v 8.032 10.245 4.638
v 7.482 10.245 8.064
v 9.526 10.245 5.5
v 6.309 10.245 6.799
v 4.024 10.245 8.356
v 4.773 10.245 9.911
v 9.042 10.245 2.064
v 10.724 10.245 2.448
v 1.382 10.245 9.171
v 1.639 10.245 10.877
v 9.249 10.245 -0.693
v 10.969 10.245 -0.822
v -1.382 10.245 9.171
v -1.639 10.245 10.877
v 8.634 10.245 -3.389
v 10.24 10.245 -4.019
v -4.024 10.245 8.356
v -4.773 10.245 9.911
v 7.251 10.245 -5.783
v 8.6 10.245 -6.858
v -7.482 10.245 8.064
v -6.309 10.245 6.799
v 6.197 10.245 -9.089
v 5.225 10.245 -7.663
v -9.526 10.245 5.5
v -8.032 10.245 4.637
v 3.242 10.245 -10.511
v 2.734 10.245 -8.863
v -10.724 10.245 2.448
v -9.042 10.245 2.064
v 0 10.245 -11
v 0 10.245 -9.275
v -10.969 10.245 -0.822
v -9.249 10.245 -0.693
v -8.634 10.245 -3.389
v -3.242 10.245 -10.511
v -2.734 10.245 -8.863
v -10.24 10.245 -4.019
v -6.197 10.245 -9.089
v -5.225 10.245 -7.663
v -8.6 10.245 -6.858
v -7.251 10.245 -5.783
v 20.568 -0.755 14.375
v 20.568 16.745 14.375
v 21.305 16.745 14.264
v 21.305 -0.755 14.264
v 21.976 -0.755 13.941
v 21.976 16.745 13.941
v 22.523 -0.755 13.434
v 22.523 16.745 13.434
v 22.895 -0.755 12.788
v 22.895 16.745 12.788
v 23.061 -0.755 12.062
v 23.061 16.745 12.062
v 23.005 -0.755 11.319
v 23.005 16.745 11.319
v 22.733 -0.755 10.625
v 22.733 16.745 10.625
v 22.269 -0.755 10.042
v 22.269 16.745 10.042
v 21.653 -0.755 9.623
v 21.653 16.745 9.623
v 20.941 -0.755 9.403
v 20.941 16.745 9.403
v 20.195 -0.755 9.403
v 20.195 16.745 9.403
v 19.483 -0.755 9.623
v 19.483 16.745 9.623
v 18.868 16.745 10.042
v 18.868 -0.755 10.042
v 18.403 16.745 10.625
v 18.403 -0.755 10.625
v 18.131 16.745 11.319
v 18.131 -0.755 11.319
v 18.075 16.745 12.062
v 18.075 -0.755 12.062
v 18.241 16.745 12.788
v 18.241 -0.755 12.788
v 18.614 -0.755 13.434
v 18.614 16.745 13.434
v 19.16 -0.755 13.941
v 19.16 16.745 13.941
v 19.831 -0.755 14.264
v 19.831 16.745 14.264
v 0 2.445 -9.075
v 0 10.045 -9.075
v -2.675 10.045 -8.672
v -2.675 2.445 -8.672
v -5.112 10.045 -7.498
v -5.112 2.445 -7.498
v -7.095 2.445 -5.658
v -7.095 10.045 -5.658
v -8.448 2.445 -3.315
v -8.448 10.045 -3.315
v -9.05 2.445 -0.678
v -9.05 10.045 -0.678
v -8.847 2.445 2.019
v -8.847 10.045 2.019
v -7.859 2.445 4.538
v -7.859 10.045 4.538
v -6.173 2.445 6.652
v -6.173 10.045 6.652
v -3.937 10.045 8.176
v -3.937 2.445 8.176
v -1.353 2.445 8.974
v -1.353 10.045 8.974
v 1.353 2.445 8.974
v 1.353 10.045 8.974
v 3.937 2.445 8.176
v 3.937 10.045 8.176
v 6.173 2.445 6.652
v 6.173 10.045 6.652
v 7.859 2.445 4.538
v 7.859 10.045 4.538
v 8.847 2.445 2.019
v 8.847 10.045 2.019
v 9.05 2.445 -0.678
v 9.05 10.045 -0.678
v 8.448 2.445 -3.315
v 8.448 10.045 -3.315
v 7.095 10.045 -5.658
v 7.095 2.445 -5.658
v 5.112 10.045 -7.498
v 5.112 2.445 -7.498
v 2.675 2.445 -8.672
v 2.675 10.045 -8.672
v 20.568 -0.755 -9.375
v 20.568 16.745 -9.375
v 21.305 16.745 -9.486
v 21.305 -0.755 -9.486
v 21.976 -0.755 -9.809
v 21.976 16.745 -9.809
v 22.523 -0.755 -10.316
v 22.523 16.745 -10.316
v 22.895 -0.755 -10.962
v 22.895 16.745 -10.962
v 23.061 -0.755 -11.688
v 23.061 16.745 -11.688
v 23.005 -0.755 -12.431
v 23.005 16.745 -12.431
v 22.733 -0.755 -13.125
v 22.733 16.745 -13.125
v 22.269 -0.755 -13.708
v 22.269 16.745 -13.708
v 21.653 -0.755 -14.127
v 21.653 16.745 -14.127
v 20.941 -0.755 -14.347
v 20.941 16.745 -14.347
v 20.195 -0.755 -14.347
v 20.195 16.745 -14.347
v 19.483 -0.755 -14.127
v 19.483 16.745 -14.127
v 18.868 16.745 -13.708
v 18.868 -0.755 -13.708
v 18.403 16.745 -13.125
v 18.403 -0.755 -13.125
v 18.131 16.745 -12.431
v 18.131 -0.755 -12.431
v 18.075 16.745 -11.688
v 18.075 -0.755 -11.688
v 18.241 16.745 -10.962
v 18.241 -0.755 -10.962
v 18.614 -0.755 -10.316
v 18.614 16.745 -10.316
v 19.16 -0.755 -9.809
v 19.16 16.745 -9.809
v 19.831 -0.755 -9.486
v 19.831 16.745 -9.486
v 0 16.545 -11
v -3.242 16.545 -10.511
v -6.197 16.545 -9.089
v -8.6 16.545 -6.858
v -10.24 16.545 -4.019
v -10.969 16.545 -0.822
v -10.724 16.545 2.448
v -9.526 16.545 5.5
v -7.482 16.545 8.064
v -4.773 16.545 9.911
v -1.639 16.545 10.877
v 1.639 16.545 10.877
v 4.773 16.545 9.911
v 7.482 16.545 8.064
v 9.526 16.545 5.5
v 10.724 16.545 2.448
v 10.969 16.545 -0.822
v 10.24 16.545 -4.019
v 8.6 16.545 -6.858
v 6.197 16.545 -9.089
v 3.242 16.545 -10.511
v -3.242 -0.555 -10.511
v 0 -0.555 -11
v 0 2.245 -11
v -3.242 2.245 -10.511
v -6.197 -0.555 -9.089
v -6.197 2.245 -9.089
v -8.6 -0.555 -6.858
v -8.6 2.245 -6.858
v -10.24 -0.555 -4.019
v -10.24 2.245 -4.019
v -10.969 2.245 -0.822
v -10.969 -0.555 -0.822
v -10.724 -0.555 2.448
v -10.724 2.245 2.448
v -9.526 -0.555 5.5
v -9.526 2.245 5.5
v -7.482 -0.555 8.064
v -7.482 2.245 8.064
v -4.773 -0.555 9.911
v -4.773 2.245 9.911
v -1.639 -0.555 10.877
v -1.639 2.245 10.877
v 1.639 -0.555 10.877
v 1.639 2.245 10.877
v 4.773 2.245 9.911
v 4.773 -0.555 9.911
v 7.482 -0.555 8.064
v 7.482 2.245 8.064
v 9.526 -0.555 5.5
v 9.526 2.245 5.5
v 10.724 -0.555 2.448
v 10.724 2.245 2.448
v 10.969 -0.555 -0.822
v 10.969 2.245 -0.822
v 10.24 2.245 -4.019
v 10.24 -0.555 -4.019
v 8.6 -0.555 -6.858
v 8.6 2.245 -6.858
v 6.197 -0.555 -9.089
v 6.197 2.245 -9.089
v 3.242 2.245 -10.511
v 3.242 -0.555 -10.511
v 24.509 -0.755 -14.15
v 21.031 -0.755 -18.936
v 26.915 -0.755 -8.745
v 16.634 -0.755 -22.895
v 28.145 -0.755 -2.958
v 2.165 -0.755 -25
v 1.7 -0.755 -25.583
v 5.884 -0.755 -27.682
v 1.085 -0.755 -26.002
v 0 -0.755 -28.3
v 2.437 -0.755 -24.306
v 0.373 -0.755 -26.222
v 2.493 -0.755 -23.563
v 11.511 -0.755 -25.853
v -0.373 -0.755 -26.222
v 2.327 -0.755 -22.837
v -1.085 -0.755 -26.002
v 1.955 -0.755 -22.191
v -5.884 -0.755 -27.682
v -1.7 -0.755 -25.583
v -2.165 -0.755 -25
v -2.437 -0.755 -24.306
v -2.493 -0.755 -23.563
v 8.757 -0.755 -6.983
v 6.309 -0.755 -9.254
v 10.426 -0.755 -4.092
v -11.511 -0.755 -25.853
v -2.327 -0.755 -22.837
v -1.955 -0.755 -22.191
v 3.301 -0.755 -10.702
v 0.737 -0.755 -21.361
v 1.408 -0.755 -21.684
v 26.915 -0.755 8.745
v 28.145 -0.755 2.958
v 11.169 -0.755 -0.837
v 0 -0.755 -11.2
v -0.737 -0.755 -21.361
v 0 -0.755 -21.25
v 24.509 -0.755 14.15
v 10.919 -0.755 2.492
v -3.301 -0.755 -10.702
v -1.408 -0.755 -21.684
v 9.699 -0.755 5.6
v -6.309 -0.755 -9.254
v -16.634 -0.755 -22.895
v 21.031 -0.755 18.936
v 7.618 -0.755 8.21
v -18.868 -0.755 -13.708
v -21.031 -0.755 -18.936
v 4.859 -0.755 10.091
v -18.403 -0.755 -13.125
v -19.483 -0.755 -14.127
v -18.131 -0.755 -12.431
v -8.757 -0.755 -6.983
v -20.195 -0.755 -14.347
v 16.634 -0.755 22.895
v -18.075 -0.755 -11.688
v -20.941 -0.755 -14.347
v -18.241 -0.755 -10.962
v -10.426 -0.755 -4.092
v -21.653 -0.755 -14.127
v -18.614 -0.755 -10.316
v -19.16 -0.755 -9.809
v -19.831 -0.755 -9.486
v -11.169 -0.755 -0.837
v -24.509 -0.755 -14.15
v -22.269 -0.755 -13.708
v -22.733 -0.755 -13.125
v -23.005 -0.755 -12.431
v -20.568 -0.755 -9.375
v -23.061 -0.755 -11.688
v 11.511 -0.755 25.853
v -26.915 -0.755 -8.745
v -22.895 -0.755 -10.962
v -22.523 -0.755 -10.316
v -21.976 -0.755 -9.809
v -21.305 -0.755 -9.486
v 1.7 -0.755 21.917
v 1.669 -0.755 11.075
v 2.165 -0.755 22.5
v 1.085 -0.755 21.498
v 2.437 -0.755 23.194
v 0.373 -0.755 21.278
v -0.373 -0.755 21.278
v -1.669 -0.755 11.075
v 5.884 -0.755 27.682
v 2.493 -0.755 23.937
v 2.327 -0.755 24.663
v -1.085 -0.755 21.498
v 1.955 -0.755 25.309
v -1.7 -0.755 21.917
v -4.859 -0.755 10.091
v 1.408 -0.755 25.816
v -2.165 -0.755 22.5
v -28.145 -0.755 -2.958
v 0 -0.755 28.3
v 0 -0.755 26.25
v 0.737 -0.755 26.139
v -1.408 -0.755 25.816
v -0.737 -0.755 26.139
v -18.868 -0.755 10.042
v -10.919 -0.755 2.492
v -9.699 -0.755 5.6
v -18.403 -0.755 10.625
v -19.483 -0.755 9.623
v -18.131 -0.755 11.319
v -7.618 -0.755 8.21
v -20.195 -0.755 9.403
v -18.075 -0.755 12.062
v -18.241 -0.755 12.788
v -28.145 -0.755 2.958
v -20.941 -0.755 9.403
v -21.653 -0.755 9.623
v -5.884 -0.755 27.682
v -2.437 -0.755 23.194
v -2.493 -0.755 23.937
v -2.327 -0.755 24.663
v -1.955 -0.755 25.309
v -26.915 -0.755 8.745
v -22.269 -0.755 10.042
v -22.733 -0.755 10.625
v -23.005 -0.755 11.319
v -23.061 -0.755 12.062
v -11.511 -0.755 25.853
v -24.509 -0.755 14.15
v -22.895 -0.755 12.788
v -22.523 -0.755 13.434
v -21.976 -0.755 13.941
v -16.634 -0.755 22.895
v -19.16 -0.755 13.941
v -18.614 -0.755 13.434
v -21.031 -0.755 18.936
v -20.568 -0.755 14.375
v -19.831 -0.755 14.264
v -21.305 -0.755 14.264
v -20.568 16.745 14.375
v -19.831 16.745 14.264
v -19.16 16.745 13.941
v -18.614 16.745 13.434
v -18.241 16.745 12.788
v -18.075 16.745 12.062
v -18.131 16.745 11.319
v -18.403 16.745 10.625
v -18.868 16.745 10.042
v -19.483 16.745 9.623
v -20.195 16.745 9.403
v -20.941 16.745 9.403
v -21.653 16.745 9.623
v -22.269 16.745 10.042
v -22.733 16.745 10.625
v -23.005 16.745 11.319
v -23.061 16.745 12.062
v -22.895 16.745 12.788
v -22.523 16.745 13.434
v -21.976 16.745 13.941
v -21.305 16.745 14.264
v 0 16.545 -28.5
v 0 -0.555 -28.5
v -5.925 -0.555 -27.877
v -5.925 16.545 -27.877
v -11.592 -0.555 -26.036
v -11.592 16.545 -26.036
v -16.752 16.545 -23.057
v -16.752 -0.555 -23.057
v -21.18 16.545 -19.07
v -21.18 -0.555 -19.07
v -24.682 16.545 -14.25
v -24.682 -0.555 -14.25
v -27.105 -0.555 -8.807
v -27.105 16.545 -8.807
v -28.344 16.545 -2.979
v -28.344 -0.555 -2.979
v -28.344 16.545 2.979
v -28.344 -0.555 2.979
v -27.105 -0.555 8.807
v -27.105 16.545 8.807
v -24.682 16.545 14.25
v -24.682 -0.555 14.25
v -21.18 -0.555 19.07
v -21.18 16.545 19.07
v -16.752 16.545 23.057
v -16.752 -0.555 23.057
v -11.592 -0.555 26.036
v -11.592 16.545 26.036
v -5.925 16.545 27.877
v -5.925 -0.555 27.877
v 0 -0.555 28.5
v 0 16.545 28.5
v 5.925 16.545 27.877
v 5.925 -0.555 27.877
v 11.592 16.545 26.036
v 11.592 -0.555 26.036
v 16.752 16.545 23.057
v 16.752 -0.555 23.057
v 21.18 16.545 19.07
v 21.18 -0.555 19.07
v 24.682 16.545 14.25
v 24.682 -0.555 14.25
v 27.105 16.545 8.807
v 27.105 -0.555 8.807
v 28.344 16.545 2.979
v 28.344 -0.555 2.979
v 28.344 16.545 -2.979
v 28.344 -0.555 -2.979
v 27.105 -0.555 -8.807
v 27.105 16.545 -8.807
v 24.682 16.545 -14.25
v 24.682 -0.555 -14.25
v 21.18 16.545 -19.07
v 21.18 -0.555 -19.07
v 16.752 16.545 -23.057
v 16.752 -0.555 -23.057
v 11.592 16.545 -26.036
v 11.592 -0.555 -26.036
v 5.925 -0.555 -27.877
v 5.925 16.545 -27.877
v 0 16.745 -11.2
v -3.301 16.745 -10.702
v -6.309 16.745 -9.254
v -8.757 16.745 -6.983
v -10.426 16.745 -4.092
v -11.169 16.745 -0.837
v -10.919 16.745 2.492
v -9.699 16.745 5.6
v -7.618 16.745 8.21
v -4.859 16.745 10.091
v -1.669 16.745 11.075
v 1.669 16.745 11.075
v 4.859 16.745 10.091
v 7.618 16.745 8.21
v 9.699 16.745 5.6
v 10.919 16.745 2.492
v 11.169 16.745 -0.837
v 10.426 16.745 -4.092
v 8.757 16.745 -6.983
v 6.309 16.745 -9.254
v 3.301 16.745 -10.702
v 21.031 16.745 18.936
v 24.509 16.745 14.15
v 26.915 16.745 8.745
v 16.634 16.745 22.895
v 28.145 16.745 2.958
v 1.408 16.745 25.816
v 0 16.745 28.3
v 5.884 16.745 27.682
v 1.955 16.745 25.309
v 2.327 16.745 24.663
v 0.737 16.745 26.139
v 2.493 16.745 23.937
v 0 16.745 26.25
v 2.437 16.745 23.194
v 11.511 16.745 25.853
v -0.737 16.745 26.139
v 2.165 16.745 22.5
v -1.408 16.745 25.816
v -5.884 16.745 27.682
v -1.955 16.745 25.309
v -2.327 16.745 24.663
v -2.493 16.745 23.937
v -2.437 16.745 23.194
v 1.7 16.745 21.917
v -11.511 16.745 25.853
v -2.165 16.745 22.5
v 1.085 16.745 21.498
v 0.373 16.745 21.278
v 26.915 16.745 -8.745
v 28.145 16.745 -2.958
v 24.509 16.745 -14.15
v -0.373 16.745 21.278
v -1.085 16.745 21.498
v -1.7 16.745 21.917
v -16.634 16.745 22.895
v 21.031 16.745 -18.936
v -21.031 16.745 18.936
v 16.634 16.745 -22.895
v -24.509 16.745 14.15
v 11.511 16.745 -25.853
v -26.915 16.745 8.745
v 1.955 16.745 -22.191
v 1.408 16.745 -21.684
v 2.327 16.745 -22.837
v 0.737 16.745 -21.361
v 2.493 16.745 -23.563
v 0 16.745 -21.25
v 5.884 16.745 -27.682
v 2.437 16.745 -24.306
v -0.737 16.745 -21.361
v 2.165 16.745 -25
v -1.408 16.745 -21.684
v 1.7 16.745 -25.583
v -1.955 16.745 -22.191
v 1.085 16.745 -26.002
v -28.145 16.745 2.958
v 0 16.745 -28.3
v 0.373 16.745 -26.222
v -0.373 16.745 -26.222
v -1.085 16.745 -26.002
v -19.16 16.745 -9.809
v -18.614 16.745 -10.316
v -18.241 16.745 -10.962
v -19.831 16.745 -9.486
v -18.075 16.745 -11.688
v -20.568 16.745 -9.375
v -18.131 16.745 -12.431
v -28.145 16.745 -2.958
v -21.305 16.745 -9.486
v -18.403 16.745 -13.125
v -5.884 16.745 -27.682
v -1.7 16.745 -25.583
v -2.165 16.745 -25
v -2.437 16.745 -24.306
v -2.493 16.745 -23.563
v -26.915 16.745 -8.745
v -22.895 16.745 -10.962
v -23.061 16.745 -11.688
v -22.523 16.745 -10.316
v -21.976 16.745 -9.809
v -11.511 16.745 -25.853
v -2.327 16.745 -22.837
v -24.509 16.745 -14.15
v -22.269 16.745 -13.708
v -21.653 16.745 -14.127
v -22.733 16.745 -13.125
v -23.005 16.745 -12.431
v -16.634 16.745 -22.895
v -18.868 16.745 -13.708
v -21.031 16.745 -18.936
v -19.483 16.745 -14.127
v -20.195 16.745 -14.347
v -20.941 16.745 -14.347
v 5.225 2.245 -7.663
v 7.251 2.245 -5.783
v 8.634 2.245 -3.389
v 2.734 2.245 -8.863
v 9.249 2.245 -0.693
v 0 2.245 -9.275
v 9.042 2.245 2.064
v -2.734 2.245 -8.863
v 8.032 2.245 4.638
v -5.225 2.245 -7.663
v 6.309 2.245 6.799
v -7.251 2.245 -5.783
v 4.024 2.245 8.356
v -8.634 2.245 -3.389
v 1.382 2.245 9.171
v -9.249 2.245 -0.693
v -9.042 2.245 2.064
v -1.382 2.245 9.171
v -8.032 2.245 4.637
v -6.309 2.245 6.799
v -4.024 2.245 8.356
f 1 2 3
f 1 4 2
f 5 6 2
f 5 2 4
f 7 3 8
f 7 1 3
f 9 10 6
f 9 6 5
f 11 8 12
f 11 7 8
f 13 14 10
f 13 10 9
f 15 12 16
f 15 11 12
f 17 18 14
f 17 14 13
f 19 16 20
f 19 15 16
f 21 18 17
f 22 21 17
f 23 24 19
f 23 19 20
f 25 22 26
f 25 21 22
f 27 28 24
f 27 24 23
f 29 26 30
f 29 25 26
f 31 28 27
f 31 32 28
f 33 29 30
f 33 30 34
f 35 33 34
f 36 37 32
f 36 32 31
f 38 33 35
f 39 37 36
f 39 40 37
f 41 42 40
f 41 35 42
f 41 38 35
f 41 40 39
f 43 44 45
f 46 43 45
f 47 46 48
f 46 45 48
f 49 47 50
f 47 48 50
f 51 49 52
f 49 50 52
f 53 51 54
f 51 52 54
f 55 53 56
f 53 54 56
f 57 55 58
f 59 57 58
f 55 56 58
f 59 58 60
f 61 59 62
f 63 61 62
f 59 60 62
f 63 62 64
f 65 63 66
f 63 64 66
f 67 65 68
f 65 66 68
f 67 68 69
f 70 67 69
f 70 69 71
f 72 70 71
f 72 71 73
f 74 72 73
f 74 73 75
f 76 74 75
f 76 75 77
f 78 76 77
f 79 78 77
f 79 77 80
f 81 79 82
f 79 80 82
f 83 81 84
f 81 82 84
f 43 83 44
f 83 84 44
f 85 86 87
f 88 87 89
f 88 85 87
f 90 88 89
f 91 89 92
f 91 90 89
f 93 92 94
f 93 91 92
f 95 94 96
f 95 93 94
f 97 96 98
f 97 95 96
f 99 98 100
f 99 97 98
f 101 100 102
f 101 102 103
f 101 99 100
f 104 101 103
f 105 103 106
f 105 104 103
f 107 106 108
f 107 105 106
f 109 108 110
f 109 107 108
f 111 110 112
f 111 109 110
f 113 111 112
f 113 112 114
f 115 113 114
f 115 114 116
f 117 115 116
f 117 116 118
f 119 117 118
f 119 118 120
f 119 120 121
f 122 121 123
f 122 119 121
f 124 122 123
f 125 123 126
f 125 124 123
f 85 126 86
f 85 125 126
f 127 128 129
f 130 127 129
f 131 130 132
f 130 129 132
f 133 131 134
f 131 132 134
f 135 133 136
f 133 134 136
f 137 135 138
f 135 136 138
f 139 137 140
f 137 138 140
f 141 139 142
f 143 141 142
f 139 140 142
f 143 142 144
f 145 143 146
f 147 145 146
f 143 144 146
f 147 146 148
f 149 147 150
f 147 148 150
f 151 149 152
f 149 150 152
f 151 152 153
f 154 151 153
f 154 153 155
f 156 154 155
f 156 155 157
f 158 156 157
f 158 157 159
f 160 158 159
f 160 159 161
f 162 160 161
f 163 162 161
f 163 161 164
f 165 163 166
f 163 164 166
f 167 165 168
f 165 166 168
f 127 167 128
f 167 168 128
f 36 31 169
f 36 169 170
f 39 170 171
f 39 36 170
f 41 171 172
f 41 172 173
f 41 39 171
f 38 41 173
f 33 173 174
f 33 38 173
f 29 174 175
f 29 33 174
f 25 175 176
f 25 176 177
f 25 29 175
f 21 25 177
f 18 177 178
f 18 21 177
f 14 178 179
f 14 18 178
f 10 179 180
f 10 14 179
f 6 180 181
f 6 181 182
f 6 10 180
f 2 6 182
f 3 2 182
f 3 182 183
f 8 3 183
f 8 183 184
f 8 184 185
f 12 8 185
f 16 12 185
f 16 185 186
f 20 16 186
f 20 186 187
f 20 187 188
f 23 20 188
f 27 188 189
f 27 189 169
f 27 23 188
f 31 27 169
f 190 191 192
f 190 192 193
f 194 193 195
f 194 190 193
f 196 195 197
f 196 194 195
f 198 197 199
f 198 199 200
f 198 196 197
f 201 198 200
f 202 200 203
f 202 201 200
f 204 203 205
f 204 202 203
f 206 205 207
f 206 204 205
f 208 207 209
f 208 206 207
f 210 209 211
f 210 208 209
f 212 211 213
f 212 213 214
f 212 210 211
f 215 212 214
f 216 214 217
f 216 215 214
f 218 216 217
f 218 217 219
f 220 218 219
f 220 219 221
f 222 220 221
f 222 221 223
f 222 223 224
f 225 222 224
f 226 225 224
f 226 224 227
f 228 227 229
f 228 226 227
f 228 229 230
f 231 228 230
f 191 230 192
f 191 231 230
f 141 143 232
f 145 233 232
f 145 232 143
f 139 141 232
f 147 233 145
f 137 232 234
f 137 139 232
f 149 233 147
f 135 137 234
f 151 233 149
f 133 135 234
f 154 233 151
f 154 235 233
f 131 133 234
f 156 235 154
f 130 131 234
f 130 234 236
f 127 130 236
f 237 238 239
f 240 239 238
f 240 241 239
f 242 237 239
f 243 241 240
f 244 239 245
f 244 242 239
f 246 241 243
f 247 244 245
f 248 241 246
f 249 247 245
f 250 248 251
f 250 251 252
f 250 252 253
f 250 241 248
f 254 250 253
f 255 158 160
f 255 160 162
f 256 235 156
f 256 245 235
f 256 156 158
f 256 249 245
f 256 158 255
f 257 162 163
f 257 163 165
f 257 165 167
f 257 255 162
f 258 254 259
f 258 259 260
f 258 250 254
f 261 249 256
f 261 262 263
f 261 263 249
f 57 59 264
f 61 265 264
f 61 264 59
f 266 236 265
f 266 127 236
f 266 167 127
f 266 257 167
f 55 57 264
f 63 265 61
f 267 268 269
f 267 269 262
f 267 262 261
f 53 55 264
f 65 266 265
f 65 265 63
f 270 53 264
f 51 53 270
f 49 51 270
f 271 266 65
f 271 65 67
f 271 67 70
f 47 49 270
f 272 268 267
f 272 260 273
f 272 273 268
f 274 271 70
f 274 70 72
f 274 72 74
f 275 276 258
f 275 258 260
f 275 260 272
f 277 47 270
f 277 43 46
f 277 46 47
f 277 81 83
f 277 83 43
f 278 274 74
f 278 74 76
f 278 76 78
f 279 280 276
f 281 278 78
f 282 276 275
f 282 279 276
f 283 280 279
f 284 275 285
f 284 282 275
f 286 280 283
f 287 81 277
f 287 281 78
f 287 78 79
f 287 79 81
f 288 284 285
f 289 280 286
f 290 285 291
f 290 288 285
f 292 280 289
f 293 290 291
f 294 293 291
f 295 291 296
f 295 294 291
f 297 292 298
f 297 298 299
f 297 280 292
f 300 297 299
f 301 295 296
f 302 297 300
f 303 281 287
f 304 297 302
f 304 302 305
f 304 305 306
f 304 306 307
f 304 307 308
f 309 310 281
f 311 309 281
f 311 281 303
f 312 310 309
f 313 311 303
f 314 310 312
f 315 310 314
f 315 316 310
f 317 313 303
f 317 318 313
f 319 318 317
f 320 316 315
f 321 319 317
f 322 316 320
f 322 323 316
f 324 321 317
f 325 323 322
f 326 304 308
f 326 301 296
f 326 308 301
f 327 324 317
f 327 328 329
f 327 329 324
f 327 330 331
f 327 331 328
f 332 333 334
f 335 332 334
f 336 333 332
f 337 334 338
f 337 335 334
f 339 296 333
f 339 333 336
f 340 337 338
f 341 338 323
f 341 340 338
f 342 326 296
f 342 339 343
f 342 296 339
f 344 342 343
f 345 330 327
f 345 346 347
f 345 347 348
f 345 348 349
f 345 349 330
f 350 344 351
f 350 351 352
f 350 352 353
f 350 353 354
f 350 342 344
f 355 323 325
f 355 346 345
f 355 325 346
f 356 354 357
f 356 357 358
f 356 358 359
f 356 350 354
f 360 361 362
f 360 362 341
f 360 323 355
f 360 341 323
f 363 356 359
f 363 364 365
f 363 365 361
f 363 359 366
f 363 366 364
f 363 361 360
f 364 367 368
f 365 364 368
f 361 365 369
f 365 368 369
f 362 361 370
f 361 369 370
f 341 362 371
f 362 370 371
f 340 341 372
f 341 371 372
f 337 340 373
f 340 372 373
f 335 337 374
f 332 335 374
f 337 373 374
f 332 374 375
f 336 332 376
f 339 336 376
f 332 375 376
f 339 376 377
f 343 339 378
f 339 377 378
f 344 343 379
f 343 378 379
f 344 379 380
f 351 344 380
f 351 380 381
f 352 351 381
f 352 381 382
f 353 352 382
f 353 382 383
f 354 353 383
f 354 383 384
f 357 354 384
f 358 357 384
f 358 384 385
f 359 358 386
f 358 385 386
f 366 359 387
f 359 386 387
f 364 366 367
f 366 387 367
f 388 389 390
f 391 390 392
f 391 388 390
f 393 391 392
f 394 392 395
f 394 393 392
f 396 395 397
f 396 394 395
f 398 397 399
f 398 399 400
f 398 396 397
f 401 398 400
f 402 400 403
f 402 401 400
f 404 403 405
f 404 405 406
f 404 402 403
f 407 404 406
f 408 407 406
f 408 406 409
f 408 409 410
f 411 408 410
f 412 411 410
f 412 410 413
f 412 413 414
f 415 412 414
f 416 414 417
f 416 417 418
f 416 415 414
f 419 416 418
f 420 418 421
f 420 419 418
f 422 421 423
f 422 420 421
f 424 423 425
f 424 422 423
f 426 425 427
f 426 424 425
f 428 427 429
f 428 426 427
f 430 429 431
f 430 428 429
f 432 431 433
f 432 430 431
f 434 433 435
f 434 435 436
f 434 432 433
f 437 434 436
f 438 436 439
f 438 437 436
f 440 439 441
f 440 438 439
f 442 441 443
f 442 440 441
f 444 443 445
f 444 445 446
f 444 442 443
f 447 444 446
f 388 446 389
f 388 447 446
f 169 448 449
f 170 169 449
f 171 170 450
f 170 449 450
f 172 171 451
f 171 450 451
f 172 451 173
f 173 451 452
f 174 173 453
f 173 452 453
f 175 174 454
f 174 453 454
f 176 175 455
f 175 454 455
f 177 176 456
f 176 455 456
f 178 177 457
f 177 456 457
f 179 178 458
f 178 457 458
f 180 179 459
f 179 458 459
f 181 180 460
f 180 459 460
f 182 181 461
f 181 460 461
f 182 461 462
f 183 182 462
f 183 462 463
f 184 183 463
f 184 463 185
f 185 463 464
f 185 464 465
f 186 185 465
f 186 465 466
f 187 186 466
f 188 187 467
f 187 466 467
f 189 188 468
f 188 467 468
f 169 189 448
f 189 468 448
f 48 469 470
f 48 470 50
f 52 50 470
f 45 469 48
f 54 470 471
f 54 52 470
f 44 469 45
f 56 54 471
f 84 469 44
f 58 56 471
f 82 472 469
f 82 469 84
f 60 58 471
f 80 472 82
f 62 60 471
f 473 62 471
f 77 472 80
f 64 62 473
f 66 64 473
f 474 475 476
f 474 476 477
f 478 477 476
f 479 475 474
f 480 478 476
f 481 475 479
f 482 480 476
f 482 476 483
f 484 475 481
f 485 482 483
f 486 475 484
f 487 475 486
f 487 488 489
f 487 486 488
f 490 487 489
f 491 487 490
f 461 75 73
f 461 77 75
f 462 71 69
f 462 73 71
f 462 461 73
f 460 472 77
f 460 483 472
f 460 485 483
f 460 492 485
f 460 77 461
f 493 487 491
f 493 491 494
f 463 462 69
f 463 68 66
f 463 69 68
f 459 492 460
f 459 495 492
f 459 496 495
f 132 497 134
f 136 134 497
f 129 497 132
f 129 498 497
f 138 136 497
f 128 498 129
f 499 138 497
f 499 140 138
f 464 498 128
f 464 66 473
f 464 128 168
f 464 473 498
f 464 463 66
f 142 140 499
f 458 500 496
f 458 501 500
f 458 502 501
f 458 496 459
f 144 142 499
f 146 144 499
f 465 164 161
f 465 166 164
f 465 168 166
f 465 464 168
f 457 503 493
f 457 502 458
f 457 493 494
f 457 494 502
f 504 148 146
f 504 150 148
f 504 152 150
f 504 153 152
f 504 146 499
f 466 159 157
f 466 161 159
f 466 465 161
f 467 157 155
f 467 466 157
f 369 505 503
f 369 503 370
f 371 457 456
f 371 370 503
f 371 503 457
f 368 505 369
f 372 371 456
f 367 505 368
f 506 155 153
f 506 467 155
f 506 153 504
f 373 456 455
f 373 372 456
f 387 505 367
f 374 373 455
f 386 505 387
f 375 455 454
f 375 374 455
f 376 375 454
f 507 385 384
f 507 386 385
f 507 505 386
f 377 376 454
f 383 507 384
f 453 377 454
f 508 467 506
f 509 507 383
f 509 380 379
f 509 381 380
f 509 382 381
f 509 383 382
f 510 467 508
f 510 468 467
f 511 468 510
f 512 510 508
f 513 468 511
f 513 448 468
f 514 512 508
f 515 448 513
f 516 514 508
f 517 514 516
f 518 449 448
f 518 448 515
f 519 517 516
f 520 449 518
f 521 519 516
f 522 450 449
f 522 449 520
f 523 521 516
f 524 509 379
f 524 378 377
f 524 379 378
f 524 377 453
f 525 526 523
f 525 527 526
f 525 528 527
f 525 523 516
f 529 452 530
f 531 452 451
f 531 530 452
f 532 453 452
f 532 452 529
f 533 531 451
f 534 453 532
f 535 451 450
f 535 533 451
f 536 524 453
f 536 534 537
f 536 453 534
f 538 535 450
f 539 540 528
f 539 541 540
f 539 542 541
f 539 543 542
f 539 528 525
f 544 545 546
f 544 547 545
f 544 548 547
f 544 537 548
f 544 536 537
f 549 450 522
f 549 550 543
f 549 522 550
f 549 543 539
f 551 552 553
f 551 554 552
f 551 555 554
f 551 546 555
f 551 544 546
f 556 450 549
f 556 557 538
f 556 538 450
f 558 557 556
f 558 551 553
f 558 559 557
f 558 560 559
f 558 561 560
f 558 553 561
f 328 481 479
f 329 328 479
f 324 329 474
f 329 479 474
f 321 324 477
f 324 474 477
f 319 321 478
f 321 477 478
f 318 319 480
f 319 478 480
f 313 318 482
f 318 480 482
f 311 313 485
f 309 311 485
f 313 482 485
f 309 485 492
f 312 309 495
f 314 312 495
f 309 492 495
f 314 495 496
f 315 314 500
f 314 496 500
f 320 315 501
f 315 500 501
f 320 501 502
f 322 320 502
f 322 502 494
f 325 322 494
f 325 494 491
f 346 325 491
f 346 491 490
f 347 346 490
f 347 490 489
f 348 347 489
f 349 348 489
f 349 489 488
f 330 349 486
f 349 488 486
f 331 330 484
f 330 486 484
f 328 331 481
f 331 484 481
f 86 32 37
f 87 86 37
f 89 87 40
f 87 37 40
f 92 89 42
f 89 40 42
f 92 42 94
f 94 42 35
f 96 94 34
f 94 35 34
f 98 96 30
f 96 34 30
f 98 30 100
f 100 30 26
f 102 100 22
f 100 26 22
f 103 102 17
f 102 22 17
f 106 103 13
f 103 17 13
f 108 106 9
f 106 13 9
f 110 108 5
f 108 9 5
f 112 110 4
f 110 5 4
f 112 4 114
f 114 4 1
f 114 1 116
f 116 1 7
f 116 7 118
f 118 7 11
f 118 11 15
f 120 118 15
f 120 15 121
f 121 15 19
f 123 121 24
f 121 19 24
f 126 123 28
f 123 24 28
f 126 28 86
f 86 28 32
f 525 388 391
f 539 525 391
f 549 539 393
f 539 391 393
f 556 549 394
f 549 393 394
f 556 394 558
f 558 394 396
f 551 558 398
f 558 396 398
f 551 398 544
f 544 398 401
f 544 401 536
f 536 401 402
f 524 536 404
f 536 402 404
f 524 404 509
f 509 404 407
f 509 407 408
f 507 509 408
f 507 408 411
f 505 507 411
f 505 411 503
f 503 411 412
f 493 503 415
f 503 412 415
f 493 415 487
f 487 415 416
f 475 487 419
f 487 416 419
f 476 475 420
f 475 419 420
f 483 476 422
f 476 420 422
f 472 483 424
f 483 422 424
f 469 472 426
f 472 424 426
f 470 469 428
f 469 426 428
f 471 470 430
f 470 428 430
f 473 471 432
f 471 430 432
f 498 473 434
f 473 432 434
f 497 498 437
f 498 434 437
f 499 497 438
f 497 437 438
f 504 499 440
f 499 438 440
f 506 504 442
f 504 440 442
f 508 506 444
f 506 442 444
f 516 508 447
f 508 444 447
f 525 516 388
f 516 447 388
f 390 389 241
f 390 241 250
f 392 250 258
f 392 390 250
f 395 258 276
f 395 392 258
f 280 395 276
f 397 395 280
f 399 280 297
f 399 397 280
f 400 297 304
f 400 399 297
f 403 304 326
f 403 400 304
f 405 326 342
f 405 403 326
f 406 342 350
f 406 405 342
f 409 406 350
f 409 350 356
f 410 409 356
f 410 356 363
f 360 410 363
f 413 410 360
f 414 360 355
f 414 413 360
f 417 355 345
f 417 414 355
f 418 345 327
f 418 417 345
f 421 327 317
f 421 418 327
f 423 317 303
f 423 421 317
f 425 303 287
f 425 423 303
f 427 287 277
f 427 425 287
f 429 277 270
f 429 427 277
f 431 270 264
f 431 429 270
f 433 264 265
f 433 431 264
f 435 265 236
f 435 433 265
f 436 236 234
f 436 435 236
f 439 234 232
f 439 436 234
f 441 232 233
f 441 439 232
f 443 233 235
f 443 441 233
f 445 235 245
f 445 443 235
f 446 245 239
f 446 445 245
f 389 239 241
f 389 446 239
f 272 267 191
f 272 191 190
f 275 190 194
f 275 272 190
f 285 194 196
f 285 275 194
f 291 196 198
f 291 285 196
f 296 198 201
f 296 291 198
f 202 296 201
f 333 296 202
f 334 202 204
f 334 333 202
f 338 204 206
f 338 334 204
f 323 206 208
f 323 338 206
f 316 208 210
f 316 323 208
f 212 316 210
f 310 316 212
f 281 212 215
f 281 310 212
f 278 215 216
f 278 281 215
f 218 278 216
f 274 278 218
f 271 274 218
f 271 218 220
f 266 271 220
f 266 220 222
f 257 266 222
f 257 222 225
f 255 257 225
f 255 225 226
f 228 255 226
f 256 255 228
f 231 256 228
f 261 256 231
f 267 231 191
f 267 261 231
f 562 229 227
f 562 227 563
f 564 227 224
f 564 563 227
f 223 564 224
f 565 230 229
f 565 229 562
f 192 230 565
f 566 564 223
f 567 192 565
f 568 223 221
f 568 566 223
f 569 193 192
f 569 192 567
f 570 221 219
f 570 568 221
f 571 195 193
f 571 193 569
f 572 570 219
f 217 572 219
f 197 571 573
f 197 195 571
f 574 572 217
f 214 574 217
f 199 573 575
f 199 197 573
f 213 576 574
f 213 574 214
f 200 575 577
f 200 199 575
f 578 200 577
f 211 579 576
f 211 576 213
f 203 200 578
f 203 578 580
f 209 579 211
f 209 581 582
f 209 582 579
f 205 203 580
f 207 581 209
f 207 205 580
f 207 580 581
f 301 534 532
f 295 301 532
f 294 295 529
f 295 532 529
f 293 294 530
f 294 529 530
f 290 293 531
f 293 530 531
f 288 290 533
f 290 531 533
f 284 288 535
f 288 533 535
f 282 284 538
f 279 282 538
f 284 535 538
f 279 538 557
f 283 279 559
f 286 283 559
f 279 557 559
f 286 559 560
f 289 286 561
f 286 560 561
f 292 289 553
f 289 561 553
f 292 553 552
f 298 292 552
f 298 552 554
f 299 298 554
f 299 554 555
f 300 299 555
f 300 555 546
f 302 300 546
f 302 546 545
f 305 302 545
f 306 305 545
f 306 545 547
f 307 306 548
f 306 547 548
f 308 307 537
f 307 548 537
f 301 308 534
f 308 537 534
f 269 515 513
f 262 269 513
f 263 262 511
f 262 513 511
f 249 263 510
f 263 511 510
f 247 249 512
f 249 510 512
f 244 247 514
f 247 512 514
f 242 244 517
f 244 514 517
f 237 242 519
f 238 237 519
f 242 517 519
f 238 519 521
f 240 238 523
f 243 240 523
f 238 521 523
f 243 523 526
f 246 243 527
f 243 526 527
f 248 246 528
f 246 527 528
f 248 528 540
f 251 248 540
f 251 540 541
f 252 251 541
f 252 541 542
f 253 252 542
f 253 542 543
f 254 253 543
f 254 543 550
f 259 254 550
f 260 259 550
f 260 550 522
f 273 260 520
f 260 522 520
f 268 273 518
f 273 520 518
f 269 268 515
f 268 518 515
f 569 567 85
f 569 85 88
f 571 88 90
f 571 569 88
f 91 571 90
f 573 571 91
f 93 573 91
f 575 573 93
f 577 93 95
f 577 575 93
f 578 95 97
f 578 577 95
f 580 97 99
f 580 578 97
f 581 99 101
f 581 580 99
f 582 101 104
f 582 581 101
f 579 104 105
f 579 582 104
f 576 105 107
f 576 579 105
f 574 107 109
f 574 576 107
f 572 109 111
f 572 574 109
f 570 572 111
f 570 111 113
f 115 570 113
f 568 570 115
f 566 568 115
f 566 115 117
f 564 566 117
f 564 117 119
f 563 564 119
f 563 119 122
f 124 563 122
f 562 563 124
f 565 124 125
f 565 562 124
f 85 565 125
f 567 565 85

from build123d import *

# Parameters (mm, degrees)
SKETCH_3_R          = 2.5
CUT_EXTRUDE_1_DEPTH = 17.5
CHAMFER_1_SIZE      = 0.2


with BuildPart() as part:
    # ｽｹｯﾁ2 → 回転1 (revolve)
    with BuildSketch(Plane.XY, mode=Mode.PRIVATE) as revolve_1_sk:
        Polygon((-9.075, 10.244997288), (-9.075, 2.244997288), (-11, 2.244997288), (-11, -0.755002712), (-28.5, -0.755002712), (-28.5, 16.744997288), (-11, 16.744997288), (-11, 10.244997288), align=None)
    revolve(revolve_1_sk.sketch.rotate(Axis((0, 0, 0), (0, 1, 0)), 270), axis=Axis((0, 0, 0), (0, 1, 0)))

    # ｽｹｯﾁ3 → ｶｯﾄ - 押し出し1 (cut)
    with BuildSketch(Plane(origin=(0, 16.744997288, 0), x_dir=(1, 0, 0), z_dir=(0, 1, 0))):
        with Locations(Location((0, 23.75, 0), (0, 0, 270))):
            Circle(SKETCH_3_R)
        with Locations(Location((20.56810334, 11.875, 0), (0, 0, 270))):
            Circle(SKETCH_3_R)
        with Locations(Location((20.56810334, -11.875, 0), (0, 0, 270))):
            Circle(SKETCH_3_R)
        with Locations(Location((0, -23.75, 0), (0, 0, 270))):
            Circle(SKETCH_3_R)
        with Locations(Location((-20.56810334, -11.875, 0), (0, 0, 270))):
            Circle(SKETCH_3_R)
        with Locations(Location((-20.56810334, 11.875, 0), (0, 0, 270))):
            Circle(SKETCH_3_R)
    extrude(amount=-CUT_EXTRUDE_1_DEPTH, mode=Mode.SUBTRACT)

    # 面取り1
    chamfer_1_edges = [part.edges().sort_by_distance(p)[0] for p in [
        (0, 16.744997288, 11),
        (0, 16.744997288, 28.5),
        (0, -0.755002712, 28.5),
        (0, -0.755002712, 11),
        (0, 2.244997288, 9.075),
        (0, 10.244997288, 9.075),
    ]]
    chamfer(chamfer_1_edges, length=CHAMFER_1_SIZE)


solid = part.part
